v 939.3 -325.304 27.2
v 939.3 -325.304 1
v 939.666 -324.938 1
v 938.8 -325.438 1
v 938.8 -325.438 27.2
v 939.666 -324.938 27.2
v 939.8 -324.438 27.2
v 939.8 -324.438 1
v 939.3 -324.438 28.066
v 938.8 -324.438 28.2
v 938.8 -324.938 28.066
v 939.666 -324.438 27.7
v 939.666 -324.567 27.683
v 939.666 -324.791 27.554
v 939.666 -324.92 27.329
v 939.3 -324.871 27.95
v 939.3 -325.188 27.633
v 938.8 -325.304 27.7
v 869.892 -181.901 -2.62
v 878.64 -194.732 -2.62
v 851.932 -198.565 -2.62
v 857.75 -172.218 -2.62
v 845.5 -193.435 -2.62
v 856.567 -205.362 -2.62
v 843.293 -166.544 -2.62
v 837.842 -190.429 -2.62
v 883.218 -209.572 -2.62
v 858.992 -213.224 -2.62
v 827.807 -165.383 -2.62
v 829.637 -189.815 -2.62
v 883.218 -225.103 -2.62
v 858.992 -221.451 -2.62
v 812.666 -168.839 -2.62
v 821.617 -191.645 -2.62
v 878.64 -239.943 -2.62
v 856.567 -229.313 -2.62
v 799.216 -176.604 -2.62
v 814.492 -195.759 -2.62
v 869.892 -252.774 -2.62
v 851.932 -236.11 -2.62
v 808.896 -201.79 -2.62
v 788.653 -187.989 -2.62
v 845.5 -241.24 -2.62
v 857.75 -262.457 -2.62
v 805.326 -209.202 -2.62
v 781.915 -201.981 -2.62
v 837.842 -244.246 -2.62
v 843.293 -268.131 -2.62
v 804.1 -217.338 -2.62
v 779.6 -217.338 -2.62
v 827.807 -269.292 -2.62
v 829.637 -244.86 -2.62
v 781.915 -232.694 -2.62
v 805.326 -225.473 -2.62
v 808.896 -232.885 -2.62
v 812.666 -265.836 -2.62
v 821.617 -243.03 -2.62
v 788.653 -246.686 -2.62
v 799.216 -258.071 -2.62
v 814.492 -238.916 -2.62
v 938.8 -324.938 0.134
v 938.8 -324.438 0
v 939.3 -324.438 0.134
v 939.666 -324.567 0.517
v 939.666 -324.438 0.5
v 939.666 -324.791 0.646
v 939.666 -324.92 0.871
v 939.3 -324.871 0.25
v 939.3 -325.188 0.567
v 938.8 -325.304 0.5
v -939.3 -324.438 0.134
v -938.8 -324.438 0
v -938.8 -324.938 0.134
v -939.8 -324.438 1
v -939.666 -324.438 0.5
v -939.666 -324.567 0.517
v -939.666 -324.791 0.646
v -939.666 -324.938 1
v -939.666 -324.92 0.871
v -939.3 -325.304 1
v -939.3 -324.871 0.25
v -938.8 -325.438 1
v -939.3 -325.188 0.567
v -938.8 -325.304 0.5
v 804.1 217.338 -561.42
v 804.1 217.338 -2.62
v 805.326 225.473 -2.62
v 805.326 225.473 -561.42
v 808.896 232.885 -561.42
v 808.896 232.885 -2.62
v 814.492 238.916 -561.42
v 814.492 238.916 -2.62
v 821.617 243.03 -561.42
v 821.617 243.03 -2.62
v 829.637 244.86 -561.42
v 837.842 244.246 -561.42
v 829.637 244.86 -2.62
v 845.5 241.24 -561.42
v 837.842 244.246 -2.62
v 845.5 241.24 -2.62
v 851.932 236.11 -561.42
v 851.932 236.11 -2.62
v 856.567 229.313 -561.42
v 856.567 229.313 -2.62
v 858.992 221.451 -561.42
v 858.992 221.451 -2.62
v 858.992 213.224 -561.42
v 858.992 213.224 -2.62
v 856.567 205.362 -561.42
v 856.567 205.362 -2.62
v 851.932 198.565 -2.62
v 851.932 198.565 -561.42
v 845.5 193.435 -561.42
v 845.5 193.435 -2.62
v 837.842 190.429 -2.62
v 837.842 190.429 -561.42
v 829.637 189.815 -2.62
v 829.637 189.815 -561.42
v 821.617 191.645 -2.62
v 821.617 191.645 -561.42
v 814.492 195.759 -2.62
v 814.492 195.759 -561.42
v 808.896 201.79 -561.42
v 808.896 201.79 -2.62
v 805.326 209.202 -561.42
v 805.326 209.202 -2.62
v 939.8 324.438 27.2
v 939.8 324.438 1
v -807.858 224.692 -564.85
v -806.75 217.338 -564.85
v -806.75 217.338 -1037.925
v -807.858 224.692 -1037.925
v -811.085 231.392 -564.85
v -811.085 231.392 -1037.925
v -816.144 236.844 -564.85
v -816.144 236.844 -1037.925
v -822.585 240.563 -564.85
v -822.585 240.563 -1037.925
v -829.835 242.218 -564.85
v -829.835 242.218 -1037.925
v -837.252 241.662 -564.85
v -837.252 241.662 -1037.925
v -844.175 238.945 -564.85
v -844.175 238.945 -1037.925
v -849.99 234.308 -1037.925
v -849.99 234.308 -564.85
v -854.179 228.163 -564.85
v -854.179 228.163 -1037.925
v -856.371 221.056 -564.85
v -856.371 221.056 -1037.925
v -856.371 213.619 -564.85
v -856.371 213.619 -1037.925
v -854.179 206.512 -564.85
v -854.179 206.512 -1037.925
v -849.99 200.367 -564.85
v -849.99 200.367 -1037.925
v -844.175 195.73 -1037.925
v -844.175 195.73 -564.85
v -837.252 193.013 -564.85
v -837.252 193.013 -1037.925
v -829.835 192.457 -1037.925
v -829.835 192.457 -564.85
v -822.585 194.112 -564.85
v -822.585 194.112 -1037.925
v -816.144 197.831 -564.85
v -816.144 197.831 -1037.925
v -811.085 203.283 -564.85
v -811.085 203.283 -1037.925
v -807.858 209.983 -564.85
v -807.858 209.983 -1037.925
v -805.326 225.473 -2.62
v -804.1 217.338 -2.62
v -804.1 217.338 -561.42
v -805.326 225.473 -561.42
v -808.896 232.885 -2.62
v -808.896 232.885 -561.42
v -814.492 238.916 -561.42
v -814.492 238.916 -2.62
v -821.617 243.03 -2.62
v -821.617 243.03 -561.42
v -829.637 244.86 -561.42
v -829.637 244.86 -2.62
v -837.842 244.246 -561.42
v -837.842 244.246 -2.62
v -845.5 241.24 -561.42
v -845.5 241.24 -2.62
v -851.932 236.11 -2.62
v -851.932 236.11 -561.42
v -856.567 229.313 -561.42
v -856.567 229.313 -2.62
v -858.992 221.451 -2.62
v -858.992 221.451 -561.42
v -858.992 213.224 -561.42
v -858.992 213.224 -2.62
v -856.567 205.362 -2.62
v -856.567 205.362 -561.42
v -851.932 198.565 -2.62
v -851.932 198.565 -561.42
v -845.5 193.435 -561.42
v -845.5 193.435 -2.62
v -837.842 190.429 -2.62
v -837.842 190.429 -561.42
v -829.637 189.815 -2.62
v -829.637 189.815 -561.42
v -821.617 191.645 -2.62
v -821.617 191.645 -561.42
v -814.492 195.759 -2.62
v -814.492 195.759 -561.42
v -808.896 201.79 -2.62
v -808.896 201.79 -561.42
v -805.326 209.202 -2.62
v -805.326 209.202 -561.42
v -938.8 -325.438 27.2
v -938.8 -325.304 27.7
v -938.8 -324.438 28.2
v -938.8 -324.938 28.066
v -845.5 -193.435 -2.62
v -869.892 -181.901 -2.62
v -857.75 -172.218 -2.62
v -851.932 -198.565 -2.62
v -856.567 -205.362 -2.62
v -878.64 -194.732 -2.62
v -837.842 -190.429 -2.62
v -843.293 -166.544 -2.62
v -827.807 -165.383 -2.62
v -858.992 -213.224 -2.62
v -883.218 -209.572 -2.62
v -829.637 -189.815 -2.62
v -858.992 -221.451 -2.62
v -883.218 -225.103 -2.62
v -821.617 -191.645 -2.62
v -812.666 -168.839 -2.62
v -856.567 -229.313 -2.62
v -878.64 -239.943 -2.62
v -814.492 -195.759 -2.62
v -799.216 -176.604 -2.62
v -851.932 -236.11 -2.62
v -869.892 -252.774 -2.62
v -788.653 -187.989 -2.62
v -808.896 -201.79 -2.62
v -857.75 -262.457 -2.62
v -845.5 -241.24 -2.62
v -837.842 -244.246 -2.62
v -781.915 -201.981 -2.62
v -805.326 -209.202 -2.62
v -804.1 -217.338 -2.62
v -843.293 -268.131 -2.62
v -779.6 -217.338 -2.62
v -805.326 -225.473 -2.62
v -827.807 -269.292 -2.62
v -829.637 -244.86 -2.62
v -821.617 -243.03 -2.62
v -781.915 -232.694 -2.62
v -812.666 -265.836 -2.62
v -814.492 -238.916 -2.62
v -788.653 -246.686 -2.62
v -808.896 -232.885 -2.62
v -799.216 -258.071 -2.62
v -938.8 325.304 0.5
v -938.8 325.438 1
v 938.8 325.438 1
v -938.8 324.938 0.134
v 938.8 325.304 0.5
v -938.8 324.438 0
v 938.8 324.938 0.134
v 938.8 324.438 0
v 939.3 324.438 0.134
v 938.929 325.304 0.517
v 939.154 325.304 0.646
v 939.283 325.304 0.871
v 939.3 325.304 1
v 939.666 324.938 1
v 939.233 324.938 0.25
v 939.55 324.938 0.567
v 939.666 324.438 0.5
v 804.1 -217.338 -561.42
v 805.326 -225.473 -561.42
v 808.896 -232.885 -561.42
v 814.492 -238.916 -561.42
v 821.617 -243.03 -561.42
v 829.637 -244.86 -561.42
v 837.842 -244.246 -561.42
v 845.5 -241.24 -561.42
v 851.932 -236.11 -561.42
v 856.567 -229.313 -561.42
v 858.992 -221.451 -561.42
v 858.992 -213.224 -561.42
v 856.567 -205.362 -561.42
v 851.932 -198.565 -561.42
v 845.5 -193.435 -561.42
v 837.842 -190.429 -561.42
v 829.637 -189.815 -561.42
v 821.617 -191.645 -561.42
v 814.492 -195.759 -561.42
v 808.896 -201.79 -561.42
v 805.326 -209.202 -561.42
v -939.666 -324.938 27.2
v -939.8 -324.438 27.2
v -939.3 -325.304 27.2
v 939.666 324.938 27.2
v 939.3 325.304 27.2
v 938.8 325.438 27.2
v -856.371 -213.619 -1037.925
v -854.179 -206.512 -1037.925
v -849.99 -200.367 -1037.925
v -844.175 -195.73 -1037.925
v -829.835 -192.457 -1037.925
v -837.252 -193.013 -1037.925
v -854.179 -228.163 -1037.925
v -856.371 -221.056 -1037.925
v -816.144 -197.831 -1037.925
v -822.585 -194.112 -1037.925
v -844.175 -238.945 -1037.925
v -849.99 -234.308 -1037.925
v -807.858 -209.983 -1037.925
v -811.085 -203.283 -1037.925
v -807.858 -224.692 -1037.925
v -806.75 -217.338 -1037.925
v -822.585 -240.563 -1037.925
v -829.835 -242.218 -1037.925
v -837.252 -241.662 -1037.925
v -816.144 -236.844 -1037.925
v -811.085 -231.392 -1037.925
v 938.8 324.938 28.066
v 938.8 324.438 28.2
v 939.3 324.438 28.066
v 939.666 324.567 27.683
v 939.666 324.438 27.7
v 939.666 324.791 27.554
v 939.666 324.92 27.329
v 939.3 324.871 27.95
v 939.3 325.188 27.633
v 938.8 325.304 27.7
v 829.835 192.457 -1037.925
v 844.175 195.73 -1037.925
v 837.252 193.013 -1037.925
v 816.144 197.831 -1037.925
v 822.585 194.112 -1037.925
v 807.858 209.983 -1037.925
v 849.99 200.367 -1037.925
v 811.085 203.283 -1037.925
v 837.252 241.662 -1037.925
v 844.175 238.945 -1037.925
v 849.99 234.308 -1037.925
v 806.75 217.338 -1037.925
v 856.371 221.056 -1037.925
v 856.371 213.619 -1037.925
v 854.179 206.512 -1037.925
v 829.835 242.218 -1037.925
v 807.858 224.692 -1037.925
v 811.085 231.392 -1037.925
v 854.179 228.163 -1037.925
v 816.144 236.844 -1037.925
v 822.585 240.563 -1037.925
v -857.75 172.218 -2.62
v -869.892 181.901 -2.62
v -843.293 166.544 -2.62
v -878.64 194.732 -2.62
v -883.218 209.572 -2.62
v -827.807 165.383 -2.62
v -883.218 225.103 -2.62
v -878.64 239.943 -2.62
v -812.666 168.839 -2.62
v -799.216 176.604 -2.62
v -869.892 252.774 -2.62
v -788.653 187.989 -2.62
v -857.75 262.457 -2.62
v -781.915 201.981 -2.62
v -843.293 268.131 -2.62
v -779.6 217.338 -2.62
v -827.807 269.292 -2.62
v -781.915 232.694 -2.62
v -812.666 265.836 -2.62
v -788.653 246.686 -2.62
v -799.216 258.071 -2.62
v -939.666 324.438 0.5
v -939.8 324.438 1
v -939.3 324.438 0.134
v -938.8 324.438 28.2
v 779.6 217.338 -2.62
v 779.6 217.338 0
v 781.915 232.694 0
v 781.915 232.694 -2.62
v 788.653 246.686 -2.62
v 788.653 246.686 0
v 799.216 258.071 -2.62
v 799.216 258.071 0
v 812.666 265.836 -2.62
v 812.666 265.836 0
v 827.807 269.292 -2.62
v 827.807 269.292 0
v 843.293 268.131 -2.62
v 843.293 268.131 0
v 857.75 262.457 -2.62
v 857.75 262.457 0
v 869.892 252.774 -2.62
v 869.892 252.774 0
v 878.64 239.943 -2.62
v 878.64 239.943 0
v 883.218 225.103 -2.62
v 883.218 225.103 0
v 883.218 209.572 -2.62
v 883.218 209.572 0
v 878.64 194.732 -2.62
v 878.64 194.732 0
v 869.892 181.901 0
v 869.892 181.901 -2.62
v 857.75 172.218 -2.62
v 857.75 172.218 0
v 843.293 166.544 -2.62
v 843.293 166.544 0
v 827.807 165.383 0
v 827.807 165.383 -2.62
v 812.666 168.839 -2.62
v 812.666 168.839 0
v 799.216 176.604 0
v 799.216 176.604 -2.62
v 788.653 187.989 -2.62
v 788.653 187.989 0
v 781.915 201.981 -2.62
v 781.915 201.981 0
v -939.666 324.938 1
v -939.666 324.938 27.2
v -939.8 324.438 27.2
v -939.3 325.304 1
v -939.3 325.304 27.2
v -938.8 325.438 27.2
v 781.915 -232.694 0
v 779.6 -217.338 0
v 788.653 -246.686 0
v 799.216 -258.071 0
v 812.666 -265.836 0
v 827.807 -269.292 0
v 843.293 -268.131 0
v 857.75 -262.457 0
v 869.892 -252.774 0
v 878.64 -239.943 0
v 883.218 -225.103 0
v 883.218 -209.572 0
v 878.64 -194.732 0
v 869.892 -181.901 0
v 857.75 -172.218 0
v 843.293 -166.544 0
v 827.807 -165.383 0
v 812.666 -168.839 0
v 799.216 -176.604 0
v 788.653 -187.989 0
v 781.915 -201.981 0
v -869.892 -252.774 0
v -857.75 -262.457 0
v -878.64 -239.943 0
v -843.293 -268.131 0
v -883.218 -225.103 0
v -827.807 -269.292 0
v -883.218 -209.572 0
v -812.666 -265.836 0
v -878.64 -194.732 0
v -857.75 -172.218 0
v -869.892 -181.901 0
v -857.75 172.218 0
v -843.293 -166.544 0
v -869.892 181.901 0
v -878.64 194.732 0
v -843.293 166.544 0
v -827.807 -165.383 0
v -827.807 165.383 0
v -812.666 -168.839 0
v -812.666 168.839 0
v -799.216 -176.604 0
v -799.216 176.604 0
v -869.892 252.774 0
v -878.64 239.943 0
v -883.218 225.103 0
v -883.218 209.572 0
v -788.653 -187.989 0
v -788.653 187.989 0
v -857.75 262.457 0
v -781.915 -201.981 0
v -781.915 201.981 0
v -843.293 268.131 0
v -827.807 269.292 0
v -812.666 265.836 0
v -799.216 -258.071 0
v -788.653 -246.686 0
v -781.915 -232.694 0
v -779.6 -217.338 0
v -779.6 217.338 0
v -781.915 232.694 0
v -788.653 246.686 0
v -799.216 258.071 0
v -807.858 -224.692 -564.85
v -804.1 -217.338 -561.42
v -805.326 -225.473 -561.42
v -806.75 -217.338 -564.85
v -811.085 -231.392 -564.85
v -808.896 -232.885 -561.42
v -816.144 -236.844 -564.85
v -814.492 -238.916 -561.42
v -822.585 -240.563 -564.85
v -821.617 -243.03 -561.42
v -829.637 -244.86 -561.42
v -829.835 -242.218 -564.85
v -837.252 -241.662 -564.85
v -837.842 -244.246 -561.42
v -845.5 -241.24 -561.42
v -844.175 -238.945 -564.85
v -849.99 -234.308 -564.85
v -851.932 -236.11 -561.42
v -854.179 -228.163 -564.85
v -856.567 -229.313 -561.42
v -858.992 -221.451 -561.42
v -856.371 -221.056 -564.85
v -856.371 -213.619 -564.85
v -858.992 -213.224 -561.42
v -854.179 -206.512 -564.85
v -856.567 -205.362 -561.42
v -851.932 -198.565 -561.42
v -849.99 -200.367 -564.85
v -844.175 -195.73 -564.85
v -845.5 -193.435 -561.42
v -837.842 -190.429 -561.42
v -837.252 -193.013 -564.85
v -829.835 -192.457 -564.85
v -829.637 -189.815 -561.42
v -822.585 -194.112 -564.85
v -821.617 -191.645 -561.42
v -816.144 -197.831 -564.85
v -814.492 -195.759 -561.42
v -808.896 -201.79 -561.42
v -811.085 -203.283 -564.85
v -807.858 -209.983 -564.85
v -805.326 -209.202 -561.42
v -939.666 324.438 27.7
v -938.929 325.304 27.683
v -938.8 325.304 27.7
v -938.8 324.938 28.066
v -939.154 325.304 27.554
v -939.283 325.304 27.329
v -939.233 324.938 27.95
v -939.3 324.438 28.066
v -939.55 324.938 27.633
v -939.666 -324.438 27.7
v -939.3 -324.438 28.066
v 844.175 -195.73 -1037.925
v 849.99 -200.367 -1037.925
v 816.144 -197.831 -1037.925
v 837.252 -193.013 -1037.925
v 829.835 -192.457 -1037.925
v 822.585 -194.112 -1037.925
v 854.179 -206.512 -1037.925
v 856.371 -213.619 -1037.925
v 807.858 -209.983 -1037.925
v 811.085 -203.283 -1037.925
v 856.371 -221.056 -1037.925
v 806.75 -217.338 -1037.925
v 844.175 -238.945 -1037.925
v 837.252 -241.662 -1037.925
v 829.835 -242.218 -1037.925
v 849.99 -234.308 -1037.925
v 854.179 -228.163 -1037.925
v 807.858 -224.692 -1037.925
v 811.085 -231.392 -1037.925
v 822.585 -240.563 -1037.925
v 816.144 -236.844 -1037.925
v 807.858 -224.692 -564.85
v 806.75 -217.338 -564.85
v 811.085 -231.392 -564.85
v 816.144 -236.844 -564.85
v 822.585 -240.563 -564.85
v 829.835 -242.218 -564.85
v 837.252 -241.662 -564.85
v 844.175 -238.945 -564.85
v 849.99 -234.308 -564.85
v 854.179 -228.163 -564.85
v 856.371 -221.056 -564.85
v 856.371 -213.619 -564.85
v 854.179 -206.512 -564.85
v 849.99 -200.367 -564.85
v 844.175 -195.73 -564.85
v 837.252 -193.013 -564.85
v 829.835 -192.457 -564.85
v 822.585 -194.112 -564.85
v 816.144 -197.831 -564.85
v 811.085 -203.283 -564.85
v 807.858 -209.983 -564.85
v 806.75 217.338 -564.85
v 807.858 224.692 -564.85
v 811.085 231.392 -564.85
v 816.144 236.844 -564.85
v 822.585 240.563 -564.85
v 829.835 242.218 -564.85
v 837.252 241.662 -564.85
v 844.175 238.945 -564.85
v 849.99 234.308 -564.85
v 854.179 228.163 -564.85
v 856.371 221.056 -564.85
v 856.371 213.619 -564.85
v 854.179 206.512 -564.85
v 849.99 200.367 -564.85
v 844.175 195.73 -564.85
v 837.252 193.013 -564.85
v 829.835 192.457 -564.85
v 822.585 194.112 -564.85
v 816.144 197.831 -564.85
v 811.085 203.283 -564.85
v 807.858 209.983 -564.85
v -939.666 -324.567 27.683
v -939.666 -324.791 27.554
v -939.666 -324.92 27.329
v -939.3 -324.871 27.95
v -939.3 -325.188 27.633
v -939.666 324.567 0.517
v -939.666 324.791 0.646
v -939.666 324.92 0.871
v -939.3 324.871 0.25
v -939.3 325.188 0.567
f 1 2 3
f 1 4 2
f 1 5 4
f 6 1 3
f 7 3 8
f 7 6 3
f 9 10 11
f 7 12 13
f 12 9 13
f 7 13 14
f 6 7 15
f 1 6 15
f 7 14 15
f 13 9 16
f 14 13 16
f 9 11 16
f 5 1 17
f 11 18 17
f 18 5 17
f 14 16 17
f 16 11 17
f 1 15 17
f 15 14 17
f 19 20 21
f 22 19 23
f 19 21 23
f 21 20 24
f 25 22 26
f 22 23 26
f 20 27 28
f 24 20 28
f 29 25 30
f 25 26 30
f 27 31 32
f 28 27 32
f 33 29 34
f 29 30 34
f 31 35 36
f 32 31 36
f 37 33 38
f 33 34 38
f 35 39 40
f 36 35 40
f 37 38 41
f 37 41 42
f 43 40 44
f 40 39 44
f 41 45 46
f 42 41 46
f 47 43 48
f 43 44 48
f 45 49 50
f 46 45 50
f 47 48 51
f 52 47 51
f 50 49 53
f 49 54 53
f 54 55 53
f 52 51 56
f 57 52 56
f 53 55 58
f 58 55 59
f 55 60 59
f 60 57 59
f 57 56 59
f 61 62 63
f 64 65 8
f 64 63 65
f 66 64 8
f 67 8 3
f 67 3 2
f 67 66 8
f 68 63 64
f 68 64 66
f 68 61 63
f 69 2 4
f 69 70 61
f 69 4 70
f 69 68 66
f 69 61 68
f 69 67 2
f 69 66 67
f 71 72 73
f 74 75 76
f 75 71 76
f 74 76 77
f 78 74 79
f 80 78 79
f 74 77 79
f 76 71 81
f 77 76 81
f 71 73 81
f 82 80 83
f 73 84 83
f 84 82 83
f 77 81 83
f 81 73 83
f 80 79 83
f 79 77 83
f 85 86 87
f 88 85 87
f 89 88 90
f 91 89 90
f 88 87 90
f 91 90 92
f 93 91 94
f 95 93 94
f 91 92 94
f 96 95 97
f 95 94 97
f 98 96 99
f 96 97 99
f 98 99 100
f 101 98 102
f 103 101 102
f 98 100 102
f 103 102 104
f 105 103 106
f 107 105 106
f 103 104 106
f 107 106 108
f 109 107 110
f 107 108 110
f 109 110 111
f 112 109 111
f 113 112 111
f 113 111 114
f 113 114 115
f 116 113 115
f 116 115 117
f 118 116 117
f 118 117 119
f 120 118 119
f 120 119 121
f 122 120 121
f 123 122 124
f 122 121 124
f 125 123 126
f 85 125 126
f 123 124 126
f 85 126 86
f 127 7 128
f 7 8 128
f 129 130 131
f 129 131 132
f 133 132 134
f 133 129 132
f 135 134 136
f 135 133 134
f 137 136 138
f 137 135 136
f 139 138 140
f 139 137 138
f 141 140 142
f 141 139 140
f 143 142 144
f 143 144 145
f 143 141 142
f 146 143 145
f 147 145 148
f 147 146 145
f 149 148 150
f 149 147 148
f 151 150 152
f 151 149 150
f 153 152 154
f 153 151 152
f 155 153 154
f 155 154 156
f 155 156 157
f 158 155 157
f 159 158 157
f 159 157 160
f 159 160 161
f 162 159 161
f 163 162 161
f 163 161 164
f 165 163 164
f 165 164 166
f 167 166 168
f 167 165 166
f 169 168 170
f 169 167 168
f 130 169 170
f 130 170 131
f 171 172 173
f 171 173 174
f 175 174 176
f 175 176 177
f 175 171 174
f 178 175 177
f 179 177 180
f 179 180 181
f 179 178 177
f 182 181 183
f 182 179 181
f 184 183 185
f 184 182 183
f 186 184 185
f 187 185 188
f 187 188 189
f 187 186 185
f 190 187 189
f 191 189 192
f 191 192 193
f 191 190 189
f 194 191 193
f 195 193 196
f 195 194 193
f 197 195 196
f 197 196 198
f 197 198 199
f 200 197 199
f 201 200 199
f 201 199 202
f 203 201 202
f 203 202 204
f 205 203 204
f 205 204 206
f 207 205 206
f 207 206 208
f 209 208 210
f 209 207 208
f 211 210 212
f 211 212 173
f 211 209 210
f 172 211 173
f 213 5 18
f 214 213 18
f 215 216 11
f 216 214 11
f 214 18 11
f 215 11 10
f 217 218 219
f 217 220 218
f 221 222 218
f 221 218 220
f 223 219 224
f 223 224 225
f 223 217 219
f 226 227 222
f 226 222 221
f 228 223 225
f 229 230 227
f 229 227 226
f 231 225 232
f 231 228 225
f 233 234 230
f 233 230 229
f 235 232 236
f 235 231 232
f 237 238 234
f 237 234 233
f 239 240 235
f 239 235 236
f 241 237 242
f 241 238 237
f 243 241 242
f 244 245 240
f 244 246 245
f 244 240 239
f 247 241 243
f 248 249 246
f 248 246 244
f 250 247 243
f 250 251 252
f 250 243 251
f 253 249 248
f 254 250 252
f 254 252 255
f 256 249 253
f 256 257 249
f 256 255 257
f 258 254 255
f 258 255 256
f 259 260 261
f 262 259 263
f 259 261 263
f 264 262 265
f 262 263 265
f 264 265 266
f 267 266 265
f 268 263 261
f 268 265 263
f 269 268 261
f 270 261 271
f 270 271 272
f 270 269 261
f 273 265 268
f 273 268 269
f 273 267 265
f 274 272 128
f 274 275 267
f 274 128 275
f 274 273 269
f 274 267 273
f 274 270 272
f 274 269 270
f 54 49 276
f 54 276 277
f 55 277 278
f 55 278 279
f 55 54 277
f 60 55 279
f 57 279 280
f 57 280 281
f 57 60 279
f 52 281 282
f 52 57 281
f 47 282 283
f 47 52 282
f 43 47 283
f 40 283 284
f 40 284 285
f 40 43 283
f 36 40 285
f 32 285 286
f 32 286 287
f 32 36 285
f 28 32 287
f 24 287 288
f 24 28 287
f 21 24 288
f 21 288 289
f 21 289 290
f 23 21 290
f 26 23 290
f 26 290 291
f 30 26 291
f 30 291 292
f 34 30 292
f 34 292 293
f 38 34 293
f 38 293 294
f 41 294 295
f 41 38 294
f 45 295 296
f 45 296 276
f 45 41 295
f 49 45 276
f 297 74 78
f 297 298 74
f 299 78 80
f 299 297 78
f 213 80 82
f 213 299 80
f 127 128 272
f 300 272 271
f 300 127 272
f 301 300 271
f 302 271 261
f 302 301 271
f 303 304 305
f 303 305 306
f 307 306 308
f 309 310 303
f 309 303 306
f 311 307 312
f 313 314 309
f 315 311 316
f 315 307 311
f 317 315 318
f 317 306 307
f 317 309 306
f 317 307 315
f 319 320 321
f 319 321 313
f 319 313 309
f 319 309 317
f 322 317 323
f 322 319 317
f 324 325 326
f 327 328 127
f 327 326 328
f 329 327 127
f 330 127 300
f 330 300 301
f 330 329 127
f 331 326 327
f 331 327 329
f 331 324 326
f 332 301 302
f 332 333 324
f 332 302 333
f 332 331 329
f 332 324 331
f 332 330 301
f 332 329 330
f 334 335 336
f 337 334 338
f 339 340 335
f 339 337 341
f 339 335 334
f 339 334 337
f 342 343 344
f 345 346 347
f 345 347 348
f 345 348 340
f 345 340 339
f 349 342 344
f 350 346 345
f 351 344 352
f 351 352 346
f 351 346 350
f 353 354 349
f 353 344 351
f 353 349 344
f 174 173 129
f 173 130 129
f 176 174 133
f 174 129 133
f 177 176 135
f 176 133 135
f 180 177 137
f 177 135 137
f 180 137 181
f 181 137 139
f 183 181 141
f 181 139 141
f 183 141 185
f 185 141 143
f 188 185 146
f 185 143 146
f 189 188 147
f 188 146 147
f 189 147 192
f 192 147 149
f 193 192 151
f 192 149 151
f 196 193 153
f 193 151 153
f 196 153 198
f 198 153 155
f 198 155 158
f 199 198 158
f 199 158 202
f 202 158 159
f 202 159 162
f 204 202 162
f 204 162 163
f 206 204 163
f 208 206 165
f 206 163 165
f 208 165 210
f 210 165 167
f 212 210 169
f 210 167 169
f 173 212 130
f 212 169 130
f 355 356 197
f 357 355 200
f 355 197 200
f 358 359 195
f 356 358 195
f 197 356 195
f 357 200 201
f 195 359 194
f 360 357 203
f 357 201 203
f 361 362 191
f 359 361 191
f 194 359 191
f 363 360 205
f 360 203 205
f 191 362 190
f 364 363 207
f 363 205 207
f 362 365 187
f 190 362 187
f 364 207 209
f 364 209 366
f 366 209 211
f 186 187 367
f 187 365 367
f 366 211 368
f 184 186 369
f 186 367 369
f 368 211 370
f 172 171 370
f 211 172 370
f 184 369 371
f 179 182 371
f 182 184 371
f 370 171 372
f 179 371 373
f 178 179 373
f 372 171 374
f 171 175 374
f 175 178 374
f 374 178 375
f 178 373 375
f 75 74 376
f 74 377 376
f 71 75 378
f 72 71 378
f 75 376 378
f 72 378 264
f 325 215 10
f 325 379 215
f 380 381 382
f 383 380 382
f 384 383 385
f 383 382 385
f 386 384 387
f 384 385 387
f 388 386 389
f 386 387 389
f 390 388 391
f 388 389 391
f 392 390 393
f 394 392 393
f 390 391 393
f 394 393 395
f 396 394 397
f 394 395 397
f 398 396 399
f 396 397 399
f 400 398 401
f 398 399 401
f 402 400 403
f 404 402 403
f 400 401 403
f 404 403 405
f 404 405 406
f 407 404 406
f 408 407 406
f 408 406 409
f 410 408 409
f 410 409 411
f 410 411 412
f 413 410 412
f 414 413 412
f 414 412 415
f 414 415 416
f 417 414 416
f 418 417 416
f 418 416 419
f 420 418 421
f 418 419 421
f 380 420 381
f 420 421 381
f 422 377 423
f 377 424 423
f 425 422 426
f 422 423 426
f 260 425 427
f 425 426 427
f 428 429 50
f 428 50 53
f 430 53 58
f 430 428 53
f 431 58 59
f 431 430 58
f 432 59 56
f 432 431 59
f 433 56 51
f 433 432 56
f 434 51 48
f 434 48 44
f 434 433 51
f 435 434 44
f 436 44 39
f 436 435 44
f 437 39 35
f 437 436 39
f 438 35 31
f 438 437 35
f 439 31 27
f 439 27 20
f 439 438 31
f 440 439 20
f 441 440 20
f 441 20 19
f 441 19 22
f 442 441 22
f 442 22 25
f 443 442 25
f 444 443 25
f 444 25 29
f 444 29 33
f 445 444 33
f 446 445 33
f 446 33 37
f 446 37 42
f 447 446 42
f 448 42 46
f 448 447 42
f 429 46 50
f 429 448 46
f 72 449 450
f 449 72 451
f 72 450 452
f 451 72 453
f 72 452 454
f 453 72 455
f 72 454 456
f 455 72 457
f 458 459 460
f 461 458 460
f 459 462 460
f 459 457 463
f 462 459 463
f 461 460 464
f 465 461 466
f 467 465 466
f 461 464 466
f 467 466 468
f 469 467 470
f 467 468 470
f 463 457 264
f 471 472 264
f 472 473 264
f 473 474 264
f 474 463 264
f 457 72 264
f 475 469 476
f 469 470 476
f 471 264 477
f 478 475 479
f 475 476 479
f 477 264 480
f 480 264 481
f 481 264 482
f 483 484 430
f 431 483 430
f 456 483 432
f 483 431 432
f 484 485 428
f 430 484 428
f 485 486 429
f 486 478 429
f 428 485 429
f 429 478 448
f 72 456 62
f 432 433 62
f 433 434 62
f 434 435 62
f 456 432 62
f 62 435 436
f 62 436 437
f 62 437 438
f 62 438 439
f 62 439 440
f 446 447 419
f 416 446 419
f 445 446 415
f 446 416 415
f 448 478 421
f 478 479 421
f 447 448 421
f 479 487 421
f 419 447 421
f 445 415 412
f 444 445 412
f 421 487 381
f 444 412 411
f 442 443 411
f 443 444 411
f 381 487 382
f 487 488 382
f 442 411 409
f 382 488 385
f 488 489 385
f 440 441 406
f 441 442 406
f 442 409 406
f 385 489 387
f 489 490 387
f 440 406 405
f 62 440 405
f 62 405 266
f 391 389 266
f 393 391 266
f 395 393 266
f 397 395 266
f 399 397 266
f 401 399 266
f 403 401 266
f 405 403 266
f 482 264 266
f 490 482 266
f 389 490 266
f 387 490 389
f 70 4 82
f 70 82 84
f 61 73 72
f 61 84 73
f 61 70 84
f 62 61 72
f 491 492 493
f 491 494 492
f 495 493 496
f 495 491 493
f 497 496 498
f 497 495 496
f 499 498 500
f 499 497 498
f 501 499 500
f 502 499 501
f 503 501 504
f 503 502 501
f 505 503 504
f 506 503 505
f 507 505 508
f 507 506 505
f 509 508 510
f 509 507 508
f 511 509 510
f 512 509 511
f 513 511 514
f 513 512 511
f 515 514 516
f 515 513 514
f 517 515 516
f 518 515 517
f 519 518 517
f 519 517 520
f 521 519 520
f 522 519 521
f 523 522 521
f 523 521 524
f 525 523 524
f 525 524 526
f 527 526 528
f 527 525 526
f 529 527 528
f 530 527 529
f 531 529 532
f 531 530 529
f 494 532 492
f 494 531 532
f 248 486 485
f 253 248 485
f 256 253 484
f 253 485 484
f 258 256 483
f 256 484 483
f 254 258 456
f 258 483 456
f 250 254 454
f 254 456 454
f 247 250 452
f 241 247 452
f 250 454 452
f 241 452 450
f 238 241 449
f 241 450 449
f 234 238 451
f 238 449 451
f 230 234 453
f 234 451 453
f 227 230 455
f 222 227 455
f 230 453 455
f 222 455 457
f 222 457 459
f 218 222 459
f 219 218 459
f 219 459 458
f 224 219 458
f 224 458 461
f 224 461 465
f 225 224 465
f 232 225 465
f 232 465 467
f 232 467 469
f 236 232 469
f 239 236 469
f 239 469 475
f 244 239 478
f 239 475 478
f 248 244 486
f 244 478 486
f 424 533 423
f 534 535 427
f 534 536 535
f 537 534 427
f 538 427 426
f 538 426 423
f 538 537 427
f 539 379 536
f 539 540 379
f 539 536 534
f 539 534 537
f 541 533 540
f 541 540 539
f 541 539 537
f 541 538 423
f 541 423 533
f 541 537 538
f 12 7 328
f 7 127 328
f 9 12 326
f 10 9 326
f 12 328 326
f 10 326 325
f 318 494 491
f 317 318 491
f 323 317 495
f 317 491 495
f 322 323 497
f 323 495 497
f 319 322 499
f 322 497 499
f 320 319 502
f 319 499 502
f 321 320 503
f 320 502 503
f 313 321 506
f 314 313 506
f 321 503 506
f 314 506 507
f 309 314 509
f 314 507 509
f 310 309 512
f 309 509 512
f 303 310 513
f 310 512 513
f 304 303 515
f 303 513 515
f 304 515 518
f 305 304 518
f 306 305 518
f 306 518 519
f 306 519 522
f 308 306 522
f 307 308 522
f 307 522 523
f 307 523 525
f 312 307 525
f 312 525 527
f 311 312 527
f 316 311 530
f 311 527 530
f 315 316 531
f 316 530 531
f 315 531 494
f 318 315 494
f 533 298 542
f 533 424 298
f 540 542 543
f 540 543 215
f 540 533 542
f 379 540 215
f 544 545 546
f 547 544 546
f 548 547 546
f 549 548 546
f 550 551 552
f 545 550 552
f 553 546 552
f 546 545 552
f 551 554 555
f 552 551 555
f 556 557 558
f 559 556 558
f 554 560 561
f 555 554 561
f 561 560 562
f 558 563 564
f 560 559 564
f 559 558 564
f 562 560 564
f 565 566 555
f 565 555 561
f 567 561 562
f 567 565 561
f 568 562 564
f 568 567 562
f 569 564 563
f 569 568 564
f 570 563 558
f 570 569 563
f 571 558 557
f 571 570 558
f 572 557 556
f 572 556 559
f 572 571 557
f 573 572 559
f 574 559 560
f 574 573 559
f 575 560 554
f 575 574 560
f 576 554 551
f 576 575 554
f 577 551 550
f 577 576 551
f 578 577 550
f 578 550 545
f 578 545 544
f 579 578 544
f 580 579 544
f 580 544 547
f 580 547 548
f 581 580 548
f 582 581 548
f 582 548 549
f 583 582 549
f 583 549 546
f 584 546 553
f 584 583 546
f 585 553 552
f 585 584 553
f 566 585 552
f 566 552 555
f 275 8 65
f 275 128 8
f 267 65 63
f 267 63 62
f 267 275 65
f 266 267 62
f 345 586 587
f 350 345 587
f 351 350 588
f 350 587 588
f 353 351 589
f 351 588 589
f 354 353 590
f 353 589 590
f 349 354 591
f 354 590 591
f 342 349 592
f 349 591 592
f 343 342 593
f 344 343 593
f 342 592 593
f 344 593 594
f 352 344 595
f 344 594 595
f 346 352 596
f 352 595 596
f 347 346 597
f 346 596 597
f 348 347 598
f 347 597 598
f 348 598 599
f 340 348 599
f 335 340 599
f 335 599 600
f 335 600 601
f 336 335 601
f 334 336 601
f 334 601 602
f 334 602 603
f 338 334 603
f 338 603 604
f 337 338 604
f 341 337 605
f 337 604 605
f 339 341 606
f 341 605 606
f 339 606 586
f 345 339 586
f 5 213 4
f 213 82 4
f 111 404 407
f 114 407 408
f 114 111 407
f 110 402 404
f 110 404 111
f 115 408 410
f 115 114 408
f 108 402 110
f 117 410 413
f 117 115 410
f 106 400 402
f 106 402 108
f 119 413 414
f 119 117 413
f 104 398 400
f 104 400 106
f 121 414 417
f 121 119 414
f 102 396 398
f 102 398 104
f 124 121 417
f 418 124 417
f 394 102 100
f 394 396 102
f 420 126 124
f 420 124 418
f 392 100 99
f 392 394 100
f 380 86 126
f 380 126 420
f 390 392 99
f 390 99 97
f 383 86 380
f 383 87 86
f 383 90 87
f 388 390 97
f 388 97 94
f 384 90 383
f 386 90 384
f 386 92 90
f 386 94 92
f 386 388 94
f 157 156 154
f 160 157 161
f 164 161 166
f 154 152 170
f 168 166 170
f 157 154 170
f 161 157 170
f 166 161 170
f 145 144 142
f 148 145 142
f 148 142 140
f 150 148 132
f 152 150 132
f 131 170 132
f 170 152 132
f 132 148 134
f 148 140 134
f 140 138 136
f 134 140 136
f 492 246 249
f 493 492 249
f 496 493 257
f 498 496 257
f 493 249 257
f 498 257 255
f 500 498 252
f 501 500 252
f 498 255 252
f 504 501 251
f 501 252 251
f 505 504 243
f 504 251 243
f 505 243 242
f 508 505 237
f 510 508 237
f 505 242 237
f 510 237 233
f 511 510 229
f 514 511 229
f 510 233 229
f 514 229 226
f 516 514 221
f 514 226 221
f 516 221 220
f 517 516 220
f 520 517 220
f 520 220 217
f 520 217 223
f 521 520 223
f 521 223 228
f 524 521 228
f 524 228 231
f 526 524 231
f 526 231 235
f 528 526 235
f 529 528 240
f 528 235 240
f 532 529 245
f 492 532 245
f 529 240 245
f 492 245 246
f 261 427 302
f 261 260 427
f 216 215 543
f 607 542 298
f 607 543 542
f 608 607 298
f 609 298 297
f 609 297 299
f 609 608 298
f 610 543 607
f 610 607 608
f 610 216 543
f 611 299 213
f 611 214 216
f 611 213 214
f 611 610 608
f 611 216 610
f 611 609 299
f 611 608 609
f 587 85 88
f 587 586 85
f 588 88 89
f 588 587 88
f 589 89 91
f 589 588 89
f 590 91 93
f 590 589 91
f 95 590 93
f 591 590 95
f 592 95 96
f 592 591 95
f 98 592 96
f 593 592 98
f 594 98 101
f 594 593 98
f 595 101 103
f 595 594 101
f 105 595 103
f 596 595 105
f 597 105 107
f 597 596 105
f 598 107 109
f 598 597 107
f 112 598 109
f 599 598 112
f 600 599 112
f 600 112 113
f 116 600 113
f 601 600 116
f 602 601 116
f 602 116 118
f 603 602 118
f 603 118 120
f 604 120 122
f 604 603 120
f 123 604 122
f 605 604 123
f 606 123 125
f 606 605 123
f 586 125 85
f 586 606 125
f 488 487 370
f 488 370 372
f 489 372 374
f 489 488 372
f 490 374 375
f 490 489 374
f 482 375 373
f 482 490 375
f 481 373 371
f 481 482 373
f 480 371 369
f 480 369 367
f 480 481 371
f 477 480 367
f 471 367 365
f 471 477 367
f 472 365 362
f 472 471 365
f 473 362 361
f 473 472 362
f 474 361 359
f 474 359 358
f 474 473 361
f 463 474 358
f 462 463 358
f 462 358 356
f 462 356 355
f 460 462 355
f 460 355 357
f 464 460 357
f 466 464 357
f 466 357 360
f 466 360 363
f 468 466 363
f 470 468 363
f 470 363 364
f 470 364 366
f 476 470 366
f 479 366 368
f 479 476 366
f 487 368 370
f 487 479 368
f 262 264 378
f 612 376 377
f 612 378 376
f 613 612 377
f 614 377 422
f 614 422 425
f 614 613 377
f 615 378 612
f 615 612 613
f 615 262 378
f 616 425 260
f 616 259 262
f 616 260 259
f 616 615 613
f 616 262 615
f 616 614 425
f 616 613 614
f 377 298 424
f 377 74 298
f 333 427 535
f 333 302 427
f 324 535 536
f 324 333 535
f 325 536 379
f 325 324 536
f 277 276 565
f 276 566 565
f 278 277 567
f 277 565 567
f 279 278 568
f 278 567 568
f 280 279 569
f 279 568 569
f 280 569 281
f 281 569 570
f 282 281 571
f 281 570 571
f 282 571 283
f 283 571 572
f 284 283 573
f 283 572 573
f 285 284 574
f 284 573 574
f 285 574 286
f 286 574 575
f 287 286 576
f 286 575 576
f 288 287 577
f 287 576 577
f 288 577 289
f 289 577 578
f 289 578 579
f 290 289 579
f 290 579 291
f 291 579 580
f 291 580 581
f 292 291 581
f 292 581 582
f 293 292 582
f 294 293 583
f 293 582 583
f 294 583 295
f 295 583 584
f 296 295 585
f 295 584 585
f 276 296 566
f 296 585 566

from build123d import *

# Parameters (mm, degrees)
F0_W      = 1879.6
F0_H      = 650.875
F1_DEPTH  = 28.2
F2_R      = 1
F3_R      = 52.1
F4_DEPTH  = 2.62
F5_R      = 27.6
F6_DEPTH  = 558.8
F8_R      = 24.95
F9_DEPTH  = 473.075
F6_FACE_R = 27.6
F9_FACE_R = 24.95


with BuildPart() as f1:
    # F0 (on Top) → F1 (new body)
    with BuildSketch(Plane.XY):
        Rectangle(F0_W, F0_H)
    extrude(amount=F1_DEPTH)

    # F2
    f2_edges = [f1.edges().sort_by_distance(p)[0] for p in [
        (0, -325.4375, 28.2),
        (0, -325.4375, 0),
        (-939.8, 0, 28.2),
        (0, 325.4375, 28.2),
        (939.8, 0, 28.2),
        (939.8, 0, 0),
        (0, 325.4375, 0),
        (-939.8, 0, 0),
        (-939.8, -325.4375, 14.1),
        (-939.8, 325.4375, 14.1),
        (939.8, 325.4375, 14.1),
        (939.8, -325.4375, 14.1),
    ]]
    fillet(f2_edges, radius=F2_R)

    # F3 (on face) → F4 (join)
    with BuildSketch(Plane(origin=(0, 0, 0), x_dir=(1, 0, 0), z_dir=(0, 0, -1))):
        with Locations((-831.7, 217.3375)):
            Circle(F3_R)
    extrude(amount=F4_DEPTH)

    # F5 (on face) → F6 (join)
    with BuildSketch(Plane(origin=(0, 0, -2.62), x_dir=(1, 0, 0), z_dir=(0, 0, -1))):
        with Locations((-831.7, 217.3375)):
            Circle(F5_R)
    extrude(amount=F6_DEPTH)



with BuildPart() as f9:
    # F8 (on offset) → F9 (new body)
    with BuildSketch(Plane(origin=(0, 0, -564.85), x_dir=(1, 0, 0), z_dir=(0, 0, -1))):
        with Locations((-831.7, 217.3375)):
            Circle(F8_R)
    extrude(amount=F9_DEPTH)


with BuildPart() as f1_1:
    add(f1.part)

    add(f9.part)  # F10 merges F9
    # F6_face (on face) → F10 section 0
    with BuildSketch(Plane(origin=(-831.7, -217.3375, -561.42), x_dir=(1, 0, 0), z_dir=(0, 0, -1))):
        Circle(F6_FACE_R)
    # F9_face (on face) → F10 section 1
    with BuildSketch(Plane(origin=(-831.7, -217.3375, -564.85), x_dir=(1, 0, 0), z_dir=(0, 0, 1))):
        Circle(F9_FACE_R)
    loft()

    # F11: F1 across plane


with BuildPart() as f1_2:
    add(f1_1.part)
    add(f1_1.part.mirror(Plane.XZ))

    # F12: F1 across plane


with BuildPart() as f1_3:
    add(f1_2.part)
    add(f1_2.part.mirror(Plane.YZ))


solid = f1_3.part
